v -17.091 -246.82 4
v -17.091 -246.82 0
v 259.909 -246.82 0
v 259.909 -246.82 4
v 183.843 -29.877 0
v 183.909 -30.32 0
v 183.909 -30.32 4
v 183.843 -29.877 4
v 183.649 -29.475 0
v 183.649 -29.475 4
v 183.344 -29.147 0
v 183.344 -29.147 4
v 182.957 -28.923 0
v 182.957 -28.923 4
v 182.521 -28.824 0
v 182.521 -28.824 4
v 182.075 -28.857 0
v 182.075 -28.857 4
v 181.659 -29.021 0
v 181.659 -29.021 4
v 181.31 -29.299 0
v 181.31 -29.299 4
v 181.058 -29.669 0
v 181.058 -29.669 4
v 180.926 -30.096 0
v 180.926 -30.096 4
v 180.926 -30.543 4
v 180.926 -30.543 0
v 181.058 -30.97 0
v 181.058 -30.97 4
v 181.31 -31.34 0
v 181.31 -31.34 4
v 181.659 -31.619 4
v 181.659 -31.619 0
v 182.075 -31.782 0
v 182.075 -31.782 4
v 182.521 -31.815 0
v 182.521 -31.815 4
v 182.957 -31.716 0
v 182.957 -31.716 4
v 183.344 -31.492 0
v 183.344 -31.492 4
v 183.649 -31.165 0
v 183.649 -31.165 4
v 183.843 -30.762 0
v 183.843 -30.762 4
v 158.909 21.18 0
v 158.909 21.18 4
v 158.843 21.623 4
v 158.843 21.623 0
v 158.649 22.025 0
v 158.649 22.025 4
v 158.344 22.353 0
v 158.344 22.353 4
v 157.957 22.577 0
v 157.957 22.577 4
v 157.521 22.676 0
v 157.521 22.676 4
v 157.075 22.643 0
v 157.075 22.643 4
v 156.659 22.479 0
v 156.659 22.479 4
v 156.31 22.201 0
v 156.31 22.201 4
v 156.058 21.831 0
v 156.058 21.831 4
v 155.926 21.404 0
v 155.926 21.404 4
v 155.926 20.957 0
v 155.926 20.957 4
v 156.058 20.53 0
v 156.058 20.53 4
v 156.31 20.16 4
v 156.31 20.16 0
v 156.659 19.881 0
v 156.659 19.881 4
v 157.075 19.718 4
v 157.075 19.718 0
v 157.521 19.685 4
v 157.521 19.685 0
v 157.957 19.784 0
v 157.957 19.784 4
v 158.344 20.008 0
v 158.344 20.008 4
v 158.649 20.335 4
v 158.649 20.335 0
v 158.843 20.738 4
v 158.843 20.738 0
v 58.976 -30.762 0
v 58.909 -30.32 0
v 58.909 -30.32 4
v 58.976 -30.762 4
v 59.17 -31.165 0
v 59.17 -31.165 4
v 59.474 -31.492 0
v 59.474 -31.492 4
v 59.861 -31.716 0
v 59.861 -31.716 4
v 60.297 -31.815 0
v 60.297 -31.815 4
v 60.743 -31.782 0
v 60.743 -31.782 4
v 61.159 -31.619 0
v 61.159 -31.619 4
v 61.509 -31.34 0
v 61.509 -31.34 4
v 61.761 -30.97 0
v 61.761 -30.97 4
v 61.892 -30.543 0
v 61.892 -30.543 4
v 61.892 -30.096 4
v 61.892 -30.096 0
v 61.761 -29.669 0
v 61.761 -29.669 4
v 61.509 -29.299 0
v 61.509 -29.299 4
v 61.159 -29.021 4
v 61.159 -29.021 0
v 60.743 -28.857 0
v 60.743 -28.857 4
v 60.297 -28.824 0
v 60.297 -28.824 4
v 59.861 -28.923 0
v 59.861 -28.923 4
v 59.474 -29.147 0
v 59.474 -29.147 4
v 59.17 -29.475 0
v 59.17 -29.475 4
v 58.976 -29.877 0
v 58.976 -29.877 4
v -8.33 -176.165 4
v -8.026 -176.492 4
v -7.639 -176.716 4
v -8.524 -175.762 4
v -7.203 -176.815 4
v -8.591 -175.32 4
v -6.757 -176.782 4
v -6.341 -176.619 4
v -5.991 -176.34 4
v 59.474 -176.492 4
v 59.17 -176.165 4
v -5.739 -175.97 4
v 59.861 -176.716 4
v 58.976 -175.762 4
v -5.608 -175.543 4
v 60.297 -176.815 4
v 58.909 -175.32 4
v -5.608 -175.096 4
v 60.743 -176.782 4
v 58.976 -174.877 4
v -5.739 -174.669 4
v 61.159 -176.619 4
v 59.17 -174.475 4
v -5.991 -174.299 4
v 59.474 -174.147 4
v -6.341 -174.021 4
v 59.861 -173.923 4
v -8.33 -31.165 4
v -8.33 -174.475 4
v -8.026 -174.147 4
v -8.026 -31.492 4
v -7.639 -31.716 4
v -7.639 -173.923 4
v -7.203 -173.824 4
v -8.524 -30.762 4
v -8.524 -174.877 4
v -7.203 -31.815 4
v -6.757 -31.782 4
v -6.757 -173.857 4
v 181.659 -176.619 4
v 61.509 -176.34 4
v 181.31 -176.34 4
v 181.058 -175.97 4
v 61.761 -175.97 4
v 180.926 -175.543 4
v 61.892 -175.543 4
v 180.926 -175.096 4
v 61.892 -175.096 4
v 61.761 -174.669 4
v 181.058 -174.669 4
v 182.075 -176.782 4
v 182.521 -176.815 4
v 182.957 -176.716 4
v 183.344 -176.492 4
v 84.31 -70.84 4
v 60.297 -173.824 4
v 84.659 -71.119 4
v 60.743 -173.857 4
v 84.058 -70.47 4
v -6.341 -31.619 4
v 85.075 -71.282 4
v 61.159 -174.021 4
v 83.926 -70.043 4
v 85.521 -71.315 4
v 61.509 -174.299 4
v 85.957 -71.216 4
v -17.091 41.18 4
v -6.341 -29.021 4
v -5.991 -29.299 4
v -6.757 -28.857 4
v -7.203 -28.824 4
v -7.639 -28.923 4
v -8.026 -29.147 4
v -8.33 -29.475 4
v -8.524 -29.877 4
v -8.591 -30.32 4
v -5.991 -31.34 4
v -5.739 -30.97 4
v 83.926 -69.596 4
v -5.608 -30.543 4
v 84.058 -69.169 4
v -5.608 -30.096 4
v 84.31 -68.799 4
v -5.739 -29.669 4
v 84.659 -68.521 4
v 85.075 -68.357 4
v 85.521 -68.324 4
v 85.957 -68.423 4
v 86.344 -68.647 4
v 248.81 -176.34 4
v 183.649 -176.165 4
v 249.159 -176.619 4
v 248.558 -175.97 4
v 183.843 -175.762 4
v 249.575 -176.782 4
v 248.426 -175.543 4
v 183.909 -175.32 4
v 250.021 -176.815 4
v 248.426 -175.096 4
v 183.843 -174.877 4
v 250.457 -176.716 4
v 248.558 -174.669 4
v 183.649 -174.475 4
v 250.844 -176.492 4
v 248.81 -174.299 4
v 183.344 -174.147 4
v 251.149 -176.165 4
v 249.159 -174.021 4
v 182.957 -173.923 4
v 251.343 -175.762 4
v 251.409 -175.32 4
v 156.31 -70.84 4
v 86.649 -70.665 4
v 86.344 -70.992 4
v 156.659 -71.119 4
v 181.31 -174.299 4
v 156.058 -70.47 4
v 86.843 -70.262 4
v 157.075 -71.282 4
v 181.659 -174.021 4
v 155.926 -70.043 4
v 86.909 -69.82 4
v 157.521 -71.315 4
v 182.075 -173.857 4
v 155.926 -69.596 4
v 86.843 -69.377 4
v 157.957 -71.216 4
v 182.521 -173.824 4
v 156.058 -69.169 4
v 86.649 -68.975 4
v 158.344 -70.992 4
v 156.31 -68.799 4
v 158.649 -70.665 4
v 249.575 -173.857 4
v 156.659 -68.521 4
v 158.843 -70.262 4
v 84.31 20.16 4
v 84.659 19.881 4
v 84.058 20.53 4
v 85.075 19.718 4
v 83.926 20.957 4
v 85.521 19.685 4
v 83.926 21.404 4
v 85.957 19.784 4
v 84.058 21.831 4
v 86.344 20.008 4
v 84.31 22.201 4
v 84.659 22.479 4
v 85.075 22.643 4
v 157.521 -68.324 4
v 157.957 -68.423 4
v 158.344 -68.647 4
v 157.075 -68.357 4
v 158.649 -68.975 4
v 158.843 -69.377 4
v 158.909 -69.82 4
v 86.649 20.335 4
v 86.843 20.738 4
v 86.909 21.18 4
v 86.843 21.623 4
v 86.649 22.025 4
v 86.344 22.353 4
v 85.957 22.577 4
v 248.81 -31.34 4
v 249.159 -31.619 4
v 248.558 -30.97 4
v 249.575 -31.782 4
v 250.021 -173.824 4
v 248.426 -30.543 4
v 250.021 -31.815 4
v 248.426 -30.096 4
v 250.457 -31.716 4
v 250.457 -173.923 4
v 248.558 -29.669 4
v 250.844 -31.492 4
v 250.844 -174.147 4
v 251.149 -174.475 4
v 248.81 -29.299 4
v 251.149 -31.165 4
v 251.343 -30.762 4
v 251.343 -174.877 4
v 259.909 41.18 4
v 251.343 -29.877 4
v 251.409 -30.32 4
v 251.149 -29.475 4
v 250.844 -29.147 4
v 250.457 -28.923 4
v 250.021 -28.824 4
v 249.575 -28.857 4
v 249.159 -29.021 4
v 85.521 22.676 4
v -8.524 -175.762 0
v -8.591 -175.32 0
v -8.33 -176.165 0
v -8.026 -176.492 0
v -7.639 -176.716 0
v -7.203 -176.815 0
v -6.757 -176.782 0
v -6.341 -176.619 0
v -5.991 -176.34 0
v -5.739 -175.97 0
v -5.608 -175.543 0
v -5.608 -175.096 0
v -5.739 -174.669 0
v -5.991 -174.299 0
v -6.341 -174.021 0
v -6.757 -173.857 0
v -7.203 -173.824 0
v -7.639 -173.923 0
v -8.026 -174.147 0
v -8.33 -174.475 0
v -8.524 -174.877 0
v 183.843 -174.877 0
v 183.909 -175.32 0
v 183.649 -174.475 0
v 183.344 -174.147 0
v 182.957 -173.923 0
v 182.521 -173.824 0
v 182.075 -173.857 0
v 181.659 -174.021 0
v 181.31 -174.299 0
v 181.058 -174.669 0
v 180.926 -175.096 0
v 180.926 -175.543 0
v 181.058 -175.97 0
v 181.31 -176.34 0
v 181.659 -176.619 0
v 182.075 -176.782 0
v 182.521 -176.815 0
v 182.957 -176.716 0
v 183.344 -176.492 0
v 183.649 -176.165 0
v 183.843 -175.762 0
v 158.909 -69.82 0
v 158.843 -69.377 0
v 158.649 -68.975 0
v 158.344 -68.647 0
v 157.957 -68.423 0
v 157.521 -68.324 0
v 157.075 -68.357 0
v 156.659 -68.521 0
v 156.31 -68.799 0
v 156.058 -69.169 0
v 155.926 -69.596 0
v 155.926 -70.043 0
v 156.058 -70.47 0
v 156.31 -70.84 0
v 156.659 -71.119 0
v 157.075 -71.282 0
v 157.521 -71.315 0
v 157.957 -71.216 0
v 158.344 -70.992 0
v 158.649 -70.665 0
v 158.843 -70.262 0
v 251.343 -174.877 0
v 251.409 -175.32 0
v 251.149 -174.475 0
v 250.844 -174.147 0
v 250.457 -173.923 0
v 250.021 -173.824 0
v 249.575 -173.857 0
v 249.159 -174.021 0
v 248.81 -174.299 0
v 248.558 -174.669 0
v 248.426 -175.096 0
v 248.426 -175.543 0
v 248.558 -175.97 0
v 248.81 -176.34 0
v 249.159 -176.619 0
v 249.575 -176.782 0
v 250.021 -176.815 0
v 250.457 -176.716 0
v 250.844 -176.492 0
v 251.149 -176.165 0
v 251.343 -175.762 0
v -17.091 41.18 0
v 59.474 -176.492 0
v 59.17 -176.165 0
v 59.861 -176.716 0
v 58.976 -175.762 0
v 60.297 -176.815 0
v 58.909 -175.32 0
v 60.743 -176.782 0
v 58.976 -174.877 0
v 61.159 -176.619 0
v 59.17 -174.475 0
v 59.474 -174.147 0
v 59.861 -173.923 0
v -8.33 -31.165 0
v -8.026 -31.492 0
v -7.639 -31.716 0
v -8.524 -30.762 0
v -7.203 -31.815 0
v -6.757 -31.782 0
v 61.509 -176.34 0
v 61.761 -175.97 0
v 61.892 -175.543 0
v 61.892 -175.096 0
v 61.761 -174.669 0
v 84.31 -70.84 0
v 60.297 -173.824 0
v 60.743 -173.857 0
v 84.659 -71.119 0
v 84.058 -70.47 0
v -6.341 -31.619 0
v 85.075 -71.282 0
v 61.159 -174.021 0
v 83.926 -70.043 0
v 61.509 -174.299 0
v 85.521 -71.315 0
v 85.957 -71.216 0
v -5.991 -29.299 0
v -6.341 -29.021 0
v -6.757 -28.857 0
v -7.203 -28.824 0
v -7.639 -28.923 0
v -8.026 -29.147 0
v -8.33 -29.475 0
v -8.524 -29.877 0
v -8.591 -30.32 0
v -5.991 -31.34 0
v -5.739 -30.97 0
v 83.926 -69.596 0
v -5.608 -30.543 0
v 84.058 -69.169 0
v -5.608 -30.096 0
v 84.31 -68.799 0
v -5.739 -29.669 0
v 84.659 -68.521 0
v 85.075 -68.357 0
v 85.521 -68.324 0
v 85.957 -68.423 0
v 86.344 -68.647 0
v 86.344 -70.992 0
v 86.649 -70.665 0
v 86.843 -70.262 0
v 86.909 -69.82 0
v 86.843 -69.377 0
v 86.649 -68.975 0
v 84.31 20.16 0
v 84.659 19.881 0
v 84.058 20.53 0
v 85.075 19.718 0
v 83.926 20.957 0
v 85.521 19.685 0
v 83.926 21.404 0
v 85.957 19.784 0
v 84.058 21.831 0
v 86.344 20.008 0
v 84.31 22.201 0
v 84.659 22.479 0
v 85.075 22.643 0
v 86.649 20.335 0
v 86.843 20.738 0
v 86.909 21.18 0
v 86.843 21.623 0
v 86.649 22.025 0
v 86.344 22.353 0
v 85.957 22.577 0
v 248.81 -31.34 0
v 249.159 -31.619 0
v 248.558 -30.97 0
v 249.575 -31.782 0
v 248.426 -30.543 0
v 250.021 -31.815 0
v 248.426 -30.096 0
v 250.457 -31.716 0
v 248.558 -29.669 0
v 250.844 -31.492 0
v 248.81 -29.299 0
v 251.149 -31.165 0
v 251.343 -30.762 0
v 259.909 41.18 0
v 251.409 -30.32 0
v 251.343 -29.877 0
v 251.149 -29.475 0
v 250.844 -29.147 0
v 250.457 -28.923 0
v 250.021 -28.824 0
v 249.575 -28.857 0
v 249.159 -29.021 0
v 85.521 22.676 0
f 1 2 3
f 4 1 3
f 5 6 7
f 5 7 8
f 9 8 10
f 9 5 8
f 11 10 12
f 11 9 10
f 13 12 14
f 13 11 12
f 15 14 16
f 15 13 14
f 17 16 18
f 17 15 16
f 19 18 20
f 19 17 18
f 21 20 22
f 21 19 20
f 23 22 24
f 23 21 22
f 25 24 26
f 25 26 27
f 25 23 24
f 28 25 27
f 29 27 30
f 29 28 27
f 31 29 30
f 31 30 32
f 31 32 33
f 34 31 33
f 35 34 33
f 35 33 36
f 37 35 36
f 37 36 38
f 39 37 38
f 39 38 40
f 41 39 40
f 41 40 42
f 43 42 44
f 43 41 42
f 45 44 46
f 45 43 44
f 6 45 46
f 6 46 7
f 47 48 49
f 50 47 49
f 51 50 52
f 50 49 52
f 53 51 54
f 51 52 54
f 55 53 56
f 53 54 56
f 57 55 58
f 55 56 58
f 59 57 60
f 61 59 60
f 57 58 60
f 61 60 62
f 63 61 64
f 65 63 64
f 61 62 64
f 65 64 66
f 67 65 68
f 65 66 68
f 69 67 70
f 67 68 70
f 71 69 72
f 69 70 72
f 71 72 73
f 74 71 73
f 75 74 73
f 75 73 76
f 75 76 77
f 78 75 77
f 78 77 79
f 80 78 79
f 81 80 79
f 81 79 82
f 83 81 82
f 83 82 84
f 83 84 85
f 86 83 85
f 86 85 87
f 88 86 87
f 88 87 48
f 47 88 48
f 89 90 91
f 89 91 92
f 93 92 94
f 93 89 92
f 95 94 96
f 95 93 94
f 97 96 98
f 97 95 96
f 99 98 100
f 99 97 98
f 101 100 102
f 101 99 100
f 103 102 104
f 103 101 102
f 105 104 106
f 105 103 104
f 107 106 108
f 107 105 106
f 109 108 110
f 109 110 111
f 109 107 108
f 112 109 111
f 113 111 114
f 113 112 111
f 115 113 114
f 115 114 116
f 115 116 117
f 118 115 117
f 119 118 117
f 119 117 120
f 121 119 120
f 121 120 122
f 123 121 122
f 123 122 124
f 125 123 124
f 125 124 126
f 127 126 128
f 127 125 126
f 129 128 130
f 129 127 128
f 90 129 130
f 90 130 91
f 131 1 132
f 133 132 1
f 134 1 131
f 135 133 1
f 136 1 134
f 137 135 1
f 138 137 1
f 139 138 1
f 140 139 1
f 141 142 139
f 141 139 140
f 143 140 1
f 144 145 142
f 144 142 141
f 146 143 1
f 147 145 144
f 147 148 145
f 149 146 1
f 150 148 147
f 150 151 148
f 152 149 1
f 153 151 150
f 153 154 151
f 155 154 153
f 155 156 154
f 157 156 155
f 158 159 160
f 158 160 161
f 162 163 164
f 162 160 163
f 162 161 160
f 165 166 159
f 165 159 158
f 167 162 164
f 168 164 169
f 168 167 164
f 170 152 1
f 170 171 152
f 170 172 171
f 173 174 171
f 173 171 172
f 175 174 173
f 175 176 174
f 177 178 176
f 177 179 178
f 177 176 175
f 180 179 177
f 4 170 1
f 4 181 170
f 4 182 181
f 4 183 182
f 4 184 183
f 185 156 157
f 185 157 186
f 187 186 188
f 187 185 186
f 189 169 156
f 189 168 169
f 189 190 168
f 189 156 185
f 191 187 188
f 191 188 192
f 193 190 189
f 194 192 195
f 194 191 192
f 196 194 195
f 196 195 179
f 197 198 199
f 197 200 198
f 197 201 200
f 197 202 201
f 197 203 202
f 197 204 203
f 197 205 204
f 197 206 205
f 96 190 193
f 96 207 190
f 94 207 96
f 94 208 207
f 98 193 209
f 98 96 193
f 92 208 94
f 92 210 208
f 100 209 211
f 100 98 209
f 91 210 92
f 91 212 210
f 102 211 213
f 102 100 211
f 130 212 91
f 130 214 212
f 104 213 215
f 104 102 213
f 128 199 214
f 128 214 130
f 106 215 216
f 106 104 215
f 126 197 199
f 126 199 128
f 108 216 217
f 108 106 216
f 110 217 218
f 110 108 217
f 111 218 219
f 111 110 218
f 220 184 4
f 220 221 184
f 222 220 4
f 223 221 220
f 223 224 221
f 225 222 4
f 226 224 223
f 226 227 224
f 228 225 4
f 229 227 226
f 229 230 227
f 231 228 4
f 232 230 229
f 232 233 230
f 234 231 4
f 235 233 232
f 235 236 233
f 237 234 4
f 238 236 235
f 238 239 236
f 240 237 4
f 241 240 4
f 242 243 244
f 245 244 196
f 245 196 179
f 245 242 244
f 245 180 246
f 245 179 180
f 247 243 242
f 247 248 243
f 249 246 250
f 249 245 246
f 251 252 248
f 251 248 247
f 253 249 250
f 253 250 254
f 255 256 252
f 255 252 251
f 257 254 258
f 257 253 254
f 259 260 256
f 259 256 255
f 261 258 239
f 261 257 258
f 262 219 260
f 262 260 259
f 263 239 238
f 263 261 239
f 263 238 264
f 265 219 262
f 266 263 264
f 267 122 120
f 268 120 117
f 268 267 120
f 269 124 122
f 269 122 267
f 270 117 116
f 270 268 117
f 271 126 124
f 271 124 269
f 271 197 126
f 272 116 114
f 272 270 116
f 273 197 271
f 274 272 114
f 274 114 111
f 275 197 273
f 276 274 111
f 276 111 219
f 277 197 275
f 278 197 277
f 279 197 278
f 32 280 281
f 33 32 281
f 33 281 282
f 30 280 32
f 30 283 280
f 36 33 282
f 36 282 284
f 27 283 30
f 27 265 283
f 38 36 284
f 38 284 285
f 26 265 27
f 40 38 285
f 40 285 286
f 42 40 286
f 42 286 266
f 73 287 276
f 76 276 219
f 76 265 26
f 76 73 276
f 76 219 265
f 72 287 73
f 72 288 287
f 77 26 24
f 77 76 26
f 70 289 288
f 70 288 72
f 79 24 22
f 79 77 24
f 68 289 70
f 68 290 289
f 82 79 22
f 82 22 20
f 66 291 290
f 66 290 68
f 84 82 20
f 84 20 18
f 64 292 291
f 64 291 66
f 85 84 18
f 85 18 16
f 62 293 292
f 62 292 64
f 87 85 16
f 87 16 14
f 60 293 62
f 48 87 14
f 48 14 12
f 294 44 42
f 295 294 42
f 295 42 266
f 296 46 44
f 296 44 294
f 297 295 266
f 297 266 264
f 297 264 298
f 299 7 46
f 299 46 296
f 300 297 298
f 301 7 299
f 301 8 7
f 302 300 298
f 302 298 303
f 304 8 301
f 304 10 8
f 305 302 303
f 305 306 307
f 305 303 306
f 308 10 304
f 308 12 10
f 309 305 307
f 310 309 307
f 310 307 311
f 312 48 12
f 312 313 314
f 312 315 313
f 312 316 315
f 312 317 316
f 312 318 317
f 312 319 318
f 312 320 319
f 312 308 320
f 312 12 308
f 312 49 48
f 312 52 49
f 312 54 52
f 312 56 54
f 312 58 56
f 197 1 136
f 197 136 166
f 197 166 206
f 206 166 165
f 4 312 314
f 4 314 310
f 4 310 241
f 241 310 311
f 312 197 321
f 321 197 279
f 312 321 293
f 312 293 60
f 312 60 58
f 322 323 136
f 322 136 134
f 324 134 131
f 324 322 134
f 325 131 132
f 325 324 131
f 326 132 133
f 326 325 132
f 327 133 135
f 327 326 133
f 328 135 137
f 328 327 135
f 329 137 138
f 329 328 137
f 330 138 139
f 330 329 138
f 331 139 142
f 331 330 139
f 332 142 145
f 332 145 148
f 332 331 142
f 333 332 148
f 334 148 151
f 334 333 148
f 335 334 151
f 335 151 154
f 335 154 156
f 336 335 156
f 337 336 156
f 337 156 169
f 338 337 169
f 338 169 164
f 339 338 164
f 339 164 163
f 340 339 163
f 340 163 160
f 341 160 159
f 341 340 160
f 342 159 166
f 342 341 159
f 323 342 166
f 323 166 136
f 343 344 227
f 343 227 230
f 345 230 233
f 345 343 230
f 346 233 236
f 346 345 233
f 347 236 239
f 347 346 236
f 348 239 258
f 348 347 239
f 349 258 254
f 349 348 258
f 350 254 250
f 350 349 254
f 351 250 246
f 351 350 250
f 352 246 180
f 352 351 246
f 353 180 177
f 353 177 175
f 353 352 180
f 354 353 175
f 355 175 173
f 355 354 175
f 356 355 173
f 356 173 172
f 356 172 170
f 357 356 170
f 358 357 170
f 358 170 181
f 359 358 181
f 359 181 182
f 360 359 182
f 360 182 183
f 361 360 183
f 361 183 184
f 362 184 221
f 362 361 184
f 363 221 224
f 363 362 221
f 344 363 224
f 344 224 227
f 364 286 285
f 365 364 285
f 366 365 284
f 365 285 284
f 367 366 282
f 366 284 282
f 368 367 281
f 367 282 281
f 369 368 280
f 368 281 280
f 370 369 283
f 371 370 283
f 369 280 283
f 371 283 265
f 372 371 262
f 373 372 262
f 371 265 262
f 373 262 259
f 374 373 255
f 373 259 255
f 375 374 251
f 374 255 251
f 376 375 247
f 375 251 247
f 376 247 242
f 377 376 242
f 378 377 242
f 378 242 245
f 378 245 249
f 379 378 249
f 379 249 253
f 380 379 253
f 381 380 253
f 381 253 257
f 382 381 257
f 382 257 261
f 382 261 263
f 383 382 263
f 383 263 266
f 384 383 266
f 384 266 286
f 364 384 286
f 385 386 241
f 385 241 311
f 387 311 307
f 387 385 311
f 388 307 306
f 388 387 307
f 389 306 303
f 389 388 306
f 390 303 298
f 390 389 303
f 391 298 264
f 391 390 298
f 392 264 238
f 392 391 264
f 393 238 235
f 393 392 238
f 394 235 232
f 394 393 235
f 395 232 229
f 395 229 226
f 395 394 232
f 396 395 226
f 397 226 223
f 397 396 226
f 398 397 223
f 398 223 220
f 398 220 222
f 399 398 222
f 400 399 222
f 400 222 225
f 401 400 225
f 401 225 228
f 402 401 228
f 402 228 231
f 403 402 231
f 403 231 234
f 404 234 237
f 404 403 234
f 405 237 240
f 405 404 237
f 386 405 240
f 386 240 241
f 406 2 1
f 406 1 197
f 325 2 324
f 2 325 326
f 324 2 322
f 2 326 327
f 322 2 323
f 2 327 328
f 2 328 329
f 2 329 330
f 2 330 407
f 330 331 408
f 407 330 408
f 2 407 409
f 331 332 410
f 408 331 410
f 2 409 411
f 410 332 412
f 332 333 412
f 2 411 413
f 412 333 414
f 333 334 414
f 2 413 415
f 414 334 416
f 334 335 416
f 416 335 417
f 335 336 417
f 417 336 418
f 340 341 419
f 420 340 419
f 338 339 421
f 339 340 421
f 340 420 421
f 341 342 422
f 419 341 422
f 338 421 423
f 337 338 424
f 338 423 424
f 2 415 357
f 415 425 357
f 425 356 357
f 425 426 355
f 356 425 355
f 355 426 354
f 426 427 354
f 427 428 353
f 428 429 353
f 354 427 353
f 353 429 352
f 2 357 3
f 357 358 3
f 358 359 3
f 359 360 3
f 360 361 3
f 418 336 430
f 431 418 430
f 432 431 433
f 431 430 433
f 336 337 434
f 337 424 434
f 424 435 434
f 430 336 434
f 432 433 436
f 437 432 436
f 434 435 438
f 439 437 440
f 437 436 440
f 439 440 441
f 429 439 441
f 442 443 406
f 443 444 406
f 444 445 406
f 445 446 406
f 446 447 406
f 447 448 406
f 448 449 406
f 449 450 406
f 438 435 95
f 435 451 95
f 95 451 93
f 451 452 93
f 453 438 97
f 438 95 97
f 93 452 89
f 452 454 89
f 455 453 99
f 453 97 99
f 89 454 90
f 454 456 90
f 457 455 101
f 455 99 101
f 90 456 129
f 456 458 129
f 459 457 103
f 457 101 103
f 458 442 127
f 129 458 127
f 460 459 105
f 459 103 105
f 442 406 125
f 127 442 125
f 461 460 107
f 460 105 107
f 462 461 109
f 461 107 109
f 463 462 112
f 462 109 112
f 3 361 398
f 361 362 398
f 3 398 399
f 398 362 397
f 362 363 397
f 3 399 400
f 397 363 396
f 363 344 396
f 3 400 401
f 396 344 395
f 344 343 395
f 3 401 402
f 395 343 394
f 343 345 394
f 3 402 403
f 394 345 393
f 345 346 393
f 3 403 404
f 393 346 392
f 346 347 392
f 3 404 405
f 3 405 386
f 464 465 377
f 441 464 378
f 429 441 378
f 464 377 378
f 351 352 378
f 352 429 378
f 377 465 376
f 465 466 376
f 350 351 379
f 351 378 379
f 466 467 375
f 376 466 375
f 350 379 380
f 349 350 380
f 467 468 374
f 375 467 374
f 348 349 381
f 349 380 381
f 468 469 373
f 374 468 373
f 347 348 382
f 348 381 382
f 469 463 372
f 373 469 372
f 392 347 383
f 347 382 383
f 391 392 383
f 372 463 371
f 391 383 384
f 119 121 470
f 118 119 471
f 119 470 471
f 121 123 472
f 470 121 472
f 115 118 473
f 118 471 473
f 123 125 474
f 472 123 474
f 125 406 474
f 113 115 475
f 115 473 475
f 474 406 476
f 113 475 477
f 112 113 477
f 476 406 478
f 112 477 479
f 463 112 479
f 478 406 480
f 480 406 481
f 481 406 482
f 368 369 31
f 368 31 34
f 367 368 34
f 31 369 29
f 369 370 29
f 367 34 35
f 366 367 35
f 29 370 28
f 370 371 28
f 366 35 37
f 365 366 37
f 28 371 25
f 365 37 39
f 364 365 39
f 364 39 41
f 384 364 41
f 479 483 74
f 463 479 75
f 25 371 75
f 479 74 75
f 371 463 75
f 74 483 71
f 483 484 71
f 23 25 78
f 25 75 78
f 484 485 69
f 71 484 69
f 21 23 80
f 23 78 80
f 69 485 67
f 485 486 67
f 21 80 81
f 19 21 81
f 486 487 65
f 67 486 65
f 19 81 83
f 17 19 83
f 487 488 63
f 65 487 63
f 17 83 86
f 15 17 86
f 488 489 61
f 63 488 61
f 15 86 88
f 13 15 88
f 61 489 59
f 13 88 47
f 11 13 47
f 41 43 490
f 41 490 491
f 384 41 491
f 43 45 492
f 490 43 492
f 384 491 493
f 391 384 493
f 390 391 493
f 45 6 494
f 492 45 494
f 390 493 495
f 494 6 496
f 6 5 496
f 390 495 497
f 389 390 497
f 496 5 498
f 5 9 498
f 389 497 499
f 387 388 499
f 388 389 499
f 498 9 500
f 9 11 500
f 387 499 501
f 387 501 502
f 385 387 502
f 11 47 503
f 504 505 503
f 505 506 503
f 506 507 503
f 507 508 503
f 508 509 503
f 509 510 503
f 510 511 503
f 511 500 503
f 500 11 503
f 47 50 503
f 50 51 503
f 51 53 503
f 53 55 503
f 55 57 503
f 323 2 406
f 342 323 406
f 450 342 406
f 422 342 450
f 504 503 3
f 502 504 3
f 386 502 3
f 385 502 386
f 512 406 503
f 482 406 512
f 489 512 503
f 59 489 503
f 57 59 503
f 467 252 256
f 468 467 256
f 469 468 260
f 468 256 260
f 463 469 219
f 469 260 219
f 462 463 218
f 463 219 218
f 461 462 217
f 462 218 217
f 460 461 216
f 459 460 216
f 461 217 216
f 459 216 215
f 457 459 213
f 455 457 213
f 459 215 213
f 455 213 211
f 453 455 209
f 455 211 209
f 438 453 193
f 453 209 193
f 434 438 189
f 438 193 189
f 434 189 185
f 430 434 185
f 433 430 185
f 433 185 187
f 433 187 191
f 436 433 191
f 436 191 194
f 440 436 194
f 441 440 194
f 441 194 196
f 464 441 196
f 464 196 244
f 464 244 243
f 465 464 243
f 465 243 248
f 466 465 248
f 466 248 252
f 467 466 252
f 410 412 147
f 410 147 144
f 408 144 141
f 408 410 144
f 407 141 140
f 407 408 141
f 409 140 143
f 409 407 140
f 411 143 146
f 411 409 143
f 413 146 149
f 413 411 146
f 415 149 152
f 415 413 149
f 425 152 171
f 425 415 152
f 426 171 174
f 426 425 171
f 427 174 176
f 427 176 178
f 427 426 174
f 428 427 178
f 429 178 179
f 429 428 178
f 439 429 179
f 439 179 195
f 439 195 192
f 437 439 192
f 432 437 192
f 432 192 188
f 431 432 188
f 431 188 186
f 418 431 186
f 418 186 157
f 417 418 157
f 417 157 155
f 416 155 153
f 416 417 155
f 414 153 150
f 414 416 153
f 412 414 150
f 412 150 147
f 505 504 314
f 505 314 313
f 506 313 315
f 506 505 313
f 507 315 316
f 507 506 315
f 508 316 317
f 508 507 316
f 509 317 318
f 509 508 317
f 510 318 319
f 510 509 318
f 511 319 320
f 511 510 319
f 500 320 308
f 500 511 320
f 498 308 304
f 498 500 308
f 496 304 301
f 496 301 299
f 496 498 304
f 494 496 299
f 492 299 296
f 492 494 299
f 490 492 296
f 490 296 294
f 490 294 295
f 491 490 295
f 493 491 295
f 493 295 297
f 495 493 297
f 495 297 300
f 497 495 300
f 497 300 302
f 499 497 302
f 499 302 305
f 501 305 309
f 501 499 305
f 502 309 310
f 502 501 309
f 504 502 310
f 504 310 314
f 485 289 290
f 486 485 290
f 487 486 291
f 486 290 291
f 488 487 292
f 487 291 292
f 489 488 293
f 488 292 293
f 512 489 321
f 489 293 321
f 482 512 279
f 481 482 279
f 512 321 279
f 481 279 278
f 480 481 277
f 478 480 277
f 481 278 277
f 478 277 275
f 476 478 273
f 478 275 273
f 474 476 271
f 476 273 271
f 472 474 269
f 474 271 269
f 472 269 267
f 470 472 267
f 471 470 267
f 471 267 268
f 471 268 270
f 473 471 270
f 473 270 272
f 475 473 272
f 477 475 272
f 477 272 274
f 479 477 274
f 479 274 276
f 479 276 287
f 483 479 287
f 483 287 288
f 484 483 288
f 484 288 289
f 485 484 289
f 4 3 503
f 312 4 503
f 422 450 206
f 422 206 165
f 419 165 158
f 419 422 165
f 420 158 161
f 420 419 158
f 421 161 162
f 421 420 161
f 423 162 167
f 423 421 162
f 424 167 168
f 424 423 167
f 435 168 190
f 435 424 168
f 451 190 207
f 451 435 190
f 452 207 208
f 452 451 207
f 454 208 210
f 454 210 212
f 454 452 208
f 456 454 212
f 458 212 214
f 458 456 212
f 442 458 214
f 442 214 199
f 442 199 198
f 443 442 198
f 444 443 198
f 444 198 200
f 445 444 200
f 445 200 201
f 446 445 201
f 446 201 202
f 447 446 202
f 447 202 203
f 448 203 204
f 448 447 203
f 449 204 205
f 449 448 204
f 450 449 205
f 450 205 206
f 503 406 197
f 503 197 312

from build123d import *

# Parameters (mm, degrees)
ESQUISSE1_W      = 277
ESQUISSE1_H      = 288
ESQUISSE1_R      = 1.5
EXTRUSION1_DEPTH = 4
ESQUISSE2_R      = 1.5
EXTRUSION2_DEPTH = 10


with BuildPart() as part:
    # Esquisse1 → Extrusion1 (new body)
    with BuildSketch(Plane.XY):
        with Locations((121.409208357, -102.819578947)):
            Rectangle(ESQUISSE1_W, ESQUISSE1_H)
        with Locations((182.409208357, -175.319578947)):
            Circle(ESQUISSE1_R, mode=Mode.SUBTRACT)
        with Locations((182.409208357, -30.319578947)):
            Circle(ESQUISSE1_R, mode=Mode.SUBTRACT)
        with Locations((249.909208357, -30.319578947)):
            Circle(ESQUISSE1_R, mode=Mode.SUBTRACT)
        with Locations((249.909208357, -175.319578947)):
            Circle(ESQUISSE1_R, mode=Mode.SUBTRACT)
        with Locations(Location((-7.090791643, -175.319578947, 0), (0, 0, 180))):
            Circle(ESQUISSE1_R, mode=Mode.SUBTRACT)
        with Locations(Location((-7.090791643, -30.319578947, 0), (0, 0, 180))):
            Circle(ESQUISSE1_R, mode=Mode.SUBTRACT)
        with Locations(Location((60.409208357, -30.319578947, 0), (0, 0, 180))):
            Circle(ESQUISSE1_R, mode=Mode.SUBTRACT)
        with Locations(Location((60.409208357, -175.319578947, 0), (0, 0, 180))):
            Circle(ESQUISSE1_R, mode=Mode.SUBTRACT)
    extrude(amount=EXTRUSION1_DEPTH)

    # Esquisse2 → Extrusion2 (cut)
    with BuildSketch(Plane.XY.offset(4)):
        with Locations((85.409208357, 21.180421053)):
            Circle(ESQUISSE2_R)
        with Locations((85.409208357, -69.819578947)):
            Circle(ESQUISSE2_R)
        with Locations((157.409208357, -69.819578947)):
            Circle(ESQUISSE2_R)
        with Locations((157.409208357, 21.180421053)):
            Circle(ESQUISSE2_R)
    extrude(amount=-EXTRUSION2_DEPTH, mode=Mode.SUBTRACT)


solid = part.part
